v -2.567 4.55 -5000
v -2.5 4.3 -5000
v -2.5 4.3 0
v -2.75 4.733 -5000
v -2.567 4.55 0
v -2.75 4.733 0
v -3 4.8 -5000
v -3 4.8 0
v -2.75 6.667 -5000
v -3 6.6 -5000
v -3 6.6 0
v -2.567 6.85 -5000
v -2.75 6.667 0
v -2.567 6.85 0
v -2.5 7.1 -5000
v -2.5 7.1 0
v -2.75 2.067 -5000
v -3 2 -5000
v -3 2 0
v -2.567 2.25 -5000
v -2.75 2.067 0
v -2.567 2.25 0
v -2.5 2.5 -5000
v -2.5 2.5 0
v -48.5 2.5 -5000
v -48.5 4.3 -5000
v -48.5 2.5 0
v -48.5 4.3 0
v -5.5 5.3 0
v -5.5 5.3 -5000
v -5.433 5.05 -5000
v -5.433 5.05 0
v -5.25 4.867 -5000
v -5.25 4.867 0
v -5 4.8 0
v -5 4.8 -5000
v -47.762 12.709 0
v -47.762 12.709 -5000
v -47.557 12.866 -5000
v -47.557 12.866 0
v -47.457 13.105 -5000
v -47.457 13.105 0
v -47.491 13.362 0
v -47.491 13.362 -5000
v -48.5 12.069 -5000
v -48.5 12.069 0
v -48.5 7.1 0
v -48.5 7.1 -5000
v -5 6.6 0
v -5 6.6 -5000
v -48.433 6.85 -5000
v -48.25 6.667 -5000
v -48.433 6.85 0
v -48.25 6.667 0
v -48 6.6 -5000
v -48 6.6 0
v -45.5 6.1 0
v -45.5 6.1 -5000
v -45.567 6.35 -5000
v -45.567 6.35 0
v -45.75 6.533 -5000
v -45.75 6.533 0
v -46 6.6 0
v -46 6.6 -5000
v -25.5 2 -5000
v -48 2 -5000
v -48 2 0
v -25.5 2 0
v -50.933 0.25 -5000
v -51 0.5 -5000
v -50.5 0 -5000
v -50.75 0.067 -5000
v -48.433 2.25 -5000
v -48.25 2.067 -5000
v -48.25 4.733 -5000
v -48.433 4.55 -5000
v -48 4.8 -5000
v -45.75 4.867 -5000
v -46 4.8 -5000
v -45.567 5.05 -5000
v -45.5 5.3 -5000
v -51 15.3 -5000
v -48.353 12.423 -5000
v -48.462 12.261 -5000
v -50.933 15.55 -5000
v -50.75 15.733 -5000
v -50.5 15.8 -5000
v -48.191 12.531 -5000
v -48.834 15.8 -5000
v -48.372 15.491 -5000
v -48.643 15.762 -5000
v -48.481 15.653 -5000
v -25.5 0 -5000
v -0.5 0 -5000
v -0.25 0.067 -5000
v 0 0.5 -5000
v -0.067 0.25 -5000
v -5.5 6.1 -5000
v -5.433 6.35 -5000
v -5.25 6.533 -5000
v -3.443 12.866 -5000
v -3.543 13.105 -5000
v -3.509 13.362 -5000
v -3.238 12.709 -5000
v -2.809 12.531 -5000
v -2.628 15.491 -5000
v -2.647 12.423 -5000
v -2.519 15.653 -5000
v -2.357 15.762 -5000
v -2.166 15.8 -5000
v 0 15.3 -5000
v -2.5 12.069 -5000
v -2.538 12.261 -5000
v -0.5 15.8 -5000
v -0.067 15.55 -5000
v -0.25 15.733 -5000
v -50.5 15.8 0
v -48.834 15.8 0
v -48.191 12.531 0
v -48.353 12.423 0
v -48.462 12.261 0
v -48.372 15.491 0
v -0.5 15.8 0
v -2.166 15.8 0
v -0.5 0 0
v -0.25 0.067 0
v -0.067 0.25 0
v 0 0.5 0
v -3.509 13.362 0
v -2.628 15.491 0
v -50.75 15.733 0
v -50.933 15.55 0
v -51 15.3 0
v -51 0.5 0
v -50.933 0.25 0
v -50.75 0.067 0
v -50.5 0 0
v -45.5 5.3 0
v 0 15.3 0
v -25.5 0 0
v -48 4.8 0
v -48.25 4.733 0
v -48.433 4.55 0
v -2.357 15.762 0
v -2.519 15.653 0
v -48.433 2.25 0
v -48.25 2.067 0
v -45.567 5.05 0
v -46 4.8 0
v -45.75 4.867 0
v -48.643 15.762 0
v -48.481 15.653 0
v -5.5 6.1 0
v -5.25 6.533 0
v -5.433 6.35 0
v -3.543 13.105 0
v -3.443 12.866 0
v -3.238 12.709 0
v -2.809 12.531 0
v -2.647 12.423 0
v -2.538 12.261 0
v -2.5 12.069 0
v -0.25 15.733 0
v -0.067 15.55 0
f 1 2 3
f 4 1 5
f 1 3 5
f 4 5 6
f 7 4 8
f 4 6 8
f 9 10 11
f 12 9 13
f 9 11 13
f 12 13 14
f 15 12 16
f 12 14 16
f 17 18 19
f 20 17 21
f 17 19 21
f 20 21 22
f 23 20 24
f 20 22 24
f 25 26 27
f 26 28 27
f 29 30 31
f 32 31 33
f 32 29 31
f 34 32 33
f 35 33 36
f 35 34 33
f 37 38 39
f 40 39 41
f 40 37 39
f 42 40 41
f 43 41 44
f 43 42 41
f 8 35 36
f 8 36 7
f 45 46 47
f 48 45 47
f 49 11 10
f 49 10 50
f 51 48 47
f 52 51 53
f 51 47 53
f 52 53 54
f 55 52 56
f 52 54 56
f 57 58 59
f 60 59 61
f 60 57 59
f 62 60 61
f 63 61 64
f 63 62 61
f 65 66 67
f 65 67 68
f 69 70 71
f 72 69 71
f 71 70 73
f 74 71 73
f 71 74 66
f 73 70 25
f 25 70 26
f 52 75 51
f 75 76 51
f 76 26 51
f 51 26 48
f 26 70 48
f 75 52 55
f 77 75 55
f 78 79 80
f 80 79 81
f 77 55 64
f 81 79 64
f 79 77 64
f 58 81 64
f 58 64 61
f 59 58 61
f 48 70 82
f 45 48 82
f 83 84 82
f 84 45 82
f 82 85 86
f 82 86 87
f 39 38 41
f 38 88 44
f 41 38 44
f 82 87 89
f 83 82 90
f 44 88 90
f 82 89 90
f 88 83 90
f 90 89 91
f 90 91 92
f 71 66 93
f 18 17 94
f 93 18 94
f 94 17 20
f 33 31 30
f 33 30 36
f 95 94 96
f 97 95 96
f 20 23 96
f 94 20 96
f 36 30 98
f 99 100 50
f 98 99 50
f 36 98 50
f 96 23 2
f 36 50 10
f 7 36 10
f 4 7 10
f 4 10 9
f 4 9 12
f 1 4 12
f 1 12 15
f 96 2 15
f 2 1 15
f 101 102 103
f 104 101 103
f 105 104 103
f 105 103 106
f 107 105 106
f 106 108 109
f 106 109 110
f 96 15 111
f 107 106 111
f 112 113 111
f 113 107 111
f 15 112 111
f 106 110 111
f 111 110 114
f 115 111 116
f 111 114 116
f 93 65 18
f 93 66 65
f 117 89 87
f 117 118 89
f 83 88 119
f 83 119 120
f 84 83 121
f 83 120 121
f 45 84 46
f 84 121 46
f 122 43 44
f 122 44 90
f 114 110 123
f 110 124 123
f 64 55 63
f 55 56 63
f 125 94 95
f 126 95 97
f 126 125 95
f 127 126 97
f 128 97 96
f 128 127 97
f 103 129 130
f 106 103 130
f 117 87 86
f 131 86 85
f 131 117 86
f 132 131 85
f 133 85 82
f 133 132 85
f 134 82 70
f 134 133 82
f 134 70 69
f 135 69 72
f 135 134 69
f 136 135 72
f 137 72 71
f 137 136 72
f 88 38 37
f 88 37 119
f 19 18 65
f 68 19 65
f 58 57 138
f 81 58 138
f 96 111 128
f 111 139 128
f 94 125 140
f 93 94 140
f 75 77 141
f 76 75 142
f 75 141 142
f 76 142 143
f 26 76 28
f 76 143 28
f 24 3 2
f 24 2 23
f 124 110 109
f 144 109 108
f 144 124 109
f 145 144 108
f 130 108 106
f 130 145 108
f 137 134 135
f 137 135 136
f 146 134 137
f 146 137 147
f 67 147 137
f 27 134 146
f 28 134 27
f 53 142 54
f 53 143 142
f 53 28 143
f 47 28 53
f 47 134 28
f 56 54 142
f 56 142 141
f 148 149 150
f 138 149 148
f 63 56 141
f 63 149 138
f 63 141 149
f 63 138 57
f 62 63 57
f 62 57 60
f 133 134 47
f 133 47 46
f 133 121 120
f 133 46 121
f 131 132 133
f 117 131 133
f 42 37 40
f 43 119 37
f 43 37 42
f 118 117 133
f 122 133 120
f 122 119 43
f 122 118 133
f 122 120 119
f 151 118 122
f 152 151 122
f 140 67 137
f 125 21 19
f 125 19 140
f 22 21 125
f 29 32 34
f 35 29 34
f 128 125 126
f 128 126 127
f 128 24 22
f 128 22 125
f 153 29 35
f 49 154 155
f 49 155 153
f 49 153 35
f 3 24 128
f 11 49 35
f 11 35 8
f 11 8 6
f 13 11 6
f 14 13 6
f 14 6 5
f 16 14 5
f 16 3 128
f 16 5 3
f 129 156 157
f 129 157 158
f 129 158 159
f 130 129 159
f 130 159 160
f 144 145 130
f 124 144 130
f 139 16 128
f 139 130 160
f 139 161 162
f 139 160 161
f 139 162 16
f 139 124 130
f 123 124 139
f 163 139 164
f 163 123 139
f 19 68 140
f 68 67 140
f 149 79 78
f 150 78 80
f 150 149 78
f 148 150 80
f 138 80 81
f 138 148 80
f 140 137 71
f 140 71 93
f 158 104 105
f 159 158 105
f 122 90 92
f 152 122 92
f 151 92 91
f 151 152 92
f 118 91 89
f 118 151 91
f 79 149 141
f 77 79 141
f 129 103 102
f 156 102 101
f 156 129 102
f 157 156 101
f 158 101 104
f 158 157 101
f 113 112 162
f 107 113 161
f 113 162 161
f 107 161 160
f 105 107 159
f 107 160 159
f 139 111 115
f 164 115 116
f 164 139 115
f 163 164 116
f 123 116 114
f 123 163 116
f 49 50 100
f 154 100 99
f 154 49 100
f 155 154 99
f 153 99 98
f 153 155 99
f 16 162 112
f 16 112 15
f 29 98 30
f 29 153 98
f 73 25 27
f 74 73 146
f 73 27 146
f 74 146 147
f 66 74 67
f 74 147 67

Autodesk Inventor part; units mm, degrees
ref_plane "YZ Plane" through (0, 0, 0) normal (1, 0, 0) x (0, 1, 0)
ref_plane "XZ Plane" through (0, 0, 0) normal (0, 1, 0) x (-1, 0, 0)
ref_plane "XY Plane" through (0, 0, 0) normal (0, 0, 1) x (1, 0, 0)
sketch "Sketch1" plane through (0, 0, 0) normal (0, 0, 1) x (1, 0, 0)
  line L0 (-2.1658, 15.8) -> (-0.5, 15.8)
  line L1 (0, 15.3) -> (0, 0.5)
  line L2 (-0.5, 0) -> (-25.5, 0)
  line L3 (-3, 2) -> (-25.5, 2)
  line L4 (-25.5, 16.3194) -> (-25.5, -3.3837) construction
  line L5 (-3, 6.6) -> (-5, 6.6)
  line L6 (-5.5, 6.1) -> (-5.5, 5.3)
  line L7 (-5, 4.8) -> (-3, 4.8)
  line L8 (-2.5, 12.0692) -> (-2.5, 7.1)
  line L9 (-2.5, 4.3) -> (-2.5, 2.5)
  line L10 (-3.5088, 13.362) -> (-2.6278, 15.4912)
  line L11 (-3.238, 12.7088) -> (-2.8088, 12.5312)
  arc A0 (-5, 6.6) -> (-5.5, 6.1) centre (-5, 6.1) ccw
  arc A1 (-5.5, 5.3) -> (-5, 4.8) centre (-5, 5.3) ccw
  arc A2 (-2.5, 4.3) -> (-3, 4.8) centre (-3, 4.3) ccw
  arc A3 (-3, 2) -> (-2.5, 2.5) centre (-3, 2.5) ccw
  arc A4 (-0.5, 0) -> (0, 0.5) centre (-0.5, 0.5) ccw
  arc A5 (-3, 6.6) -> (-2.5, 7.1) centre (-3, 7.1) ccw
  arc A6 (-2.5, 12.0692) -> (-2.8088, 12.5312) centre (-3, 12.0692) ccw
  arc A7 (-3.5088, 13.362) -> (-3.238, 12.7088) centre (-3.0468, 13.1708) ccw
  arc A8 (-2.1658, 15.8) -> (-2.6278, 15.4912) centre (-2.1658, 15.3) ccw
  arc A9 (0, 15.3) -> (-0.5, 15.8) centre (-0.5, 15.3) ccw
  line L12 (-48.8342, 15.8) -> (-50.5, 15.8)
  line L13 (-51, 15.3) -> (-51, 0.5)
  line L14 (-50.5, 0) -> (-25.5, 0)
  line L15 (-48, 2) -> (-25.5, 2)
  line L16 (-48, 6.6) -> (-46, 6.6)
  line L17 (-45.5, 6.1) -> (-45.5, 5.3)
  line L18 (-46, 4.8) -> (-48, 4.8)
  line L19 (-48.5, 12.0692) -> (-48.5, 7.1)
  line L20 (-48.5, 4.3) -> (-48.5, 2.5)
  line L21 (-47.4912, 13.362) -> (-48.3722, 15.4912)
  line L22 (-47.762, 12.7088) -> (-48.1912, 12.5312)
  arc A10 (-45.5, 6.1) -> (-46, 6.6) centre (-46, 6.1) ccw
  arc A11 (-46, 4.8) -> (-45.5, 5.3) centre (-46, 5.3) ccw
  arc A12 (-48, 4.8) -> (-48.5, 4.3) centre (-48, 4.3) ccw
  arc A13 (-48.5, 2.5) -> (-48, 2) centre (-48, 2.5) ccw
  arc A14 (-51, 0.5) -> (-50.5, 0) centre (-50.5, 0.5) ccw
  arc A15 (-48.5, 7.1) -> (-48, 6.6) centre (-48, 7.1) ccw
  arc A16 (-48.1912, 12.5312) -> (-48.5, 12.0692) centre (-48, 12.0692) ccw
  arc A17 (-47.762, 12.7088) -> (-47.4912, 13.362) centre (-47.9532, 13.1708) ccw
  arc A18 (-48.3722, 15.4912) -> (-48.8342, 15.8) centre (-48.8342, 15.3) ccw
  arc A19 (-50.5, 15.8) -> (-51, 15.3) centre (-50.5, 15.3) ccw
  point P0 (0, 0)
  point P1 (0, 0)
  point P2 (-5.5, 4.8)
  point P3 (-2.5, 4.8)
  point P4 (-3.7, 12.9)
  point P5 (-2.5, 12.4034)
  point P6 (-51, 0)
  point P7 (-51, 0)
  point P8 (-45.5, 4.8)
  point P9 (-48.5, 4.8)
  point P10 (-47.3, 12.9)
  point P11 (-48.5, 12.4034)
  dimension "d2" = 2
  dimension "d7" = 25.5
  dimension "d10" = 1.8
  dimension "d12" = 15.8
  dimension "d13" = 2.5
  dimension "d14" = 3
  dimension "d15" = 6.3
  dimension "d17" = 1.2
  dimension "d18" = 1.2
  dimension "d19" = 0.5
extrude "Extrusion1" add sketch "Sketch1" against normal blind 5000
properties part number "HD - 403 PERFIL ALUMINIO - TRAVESAÑO HORIZONTAL"
